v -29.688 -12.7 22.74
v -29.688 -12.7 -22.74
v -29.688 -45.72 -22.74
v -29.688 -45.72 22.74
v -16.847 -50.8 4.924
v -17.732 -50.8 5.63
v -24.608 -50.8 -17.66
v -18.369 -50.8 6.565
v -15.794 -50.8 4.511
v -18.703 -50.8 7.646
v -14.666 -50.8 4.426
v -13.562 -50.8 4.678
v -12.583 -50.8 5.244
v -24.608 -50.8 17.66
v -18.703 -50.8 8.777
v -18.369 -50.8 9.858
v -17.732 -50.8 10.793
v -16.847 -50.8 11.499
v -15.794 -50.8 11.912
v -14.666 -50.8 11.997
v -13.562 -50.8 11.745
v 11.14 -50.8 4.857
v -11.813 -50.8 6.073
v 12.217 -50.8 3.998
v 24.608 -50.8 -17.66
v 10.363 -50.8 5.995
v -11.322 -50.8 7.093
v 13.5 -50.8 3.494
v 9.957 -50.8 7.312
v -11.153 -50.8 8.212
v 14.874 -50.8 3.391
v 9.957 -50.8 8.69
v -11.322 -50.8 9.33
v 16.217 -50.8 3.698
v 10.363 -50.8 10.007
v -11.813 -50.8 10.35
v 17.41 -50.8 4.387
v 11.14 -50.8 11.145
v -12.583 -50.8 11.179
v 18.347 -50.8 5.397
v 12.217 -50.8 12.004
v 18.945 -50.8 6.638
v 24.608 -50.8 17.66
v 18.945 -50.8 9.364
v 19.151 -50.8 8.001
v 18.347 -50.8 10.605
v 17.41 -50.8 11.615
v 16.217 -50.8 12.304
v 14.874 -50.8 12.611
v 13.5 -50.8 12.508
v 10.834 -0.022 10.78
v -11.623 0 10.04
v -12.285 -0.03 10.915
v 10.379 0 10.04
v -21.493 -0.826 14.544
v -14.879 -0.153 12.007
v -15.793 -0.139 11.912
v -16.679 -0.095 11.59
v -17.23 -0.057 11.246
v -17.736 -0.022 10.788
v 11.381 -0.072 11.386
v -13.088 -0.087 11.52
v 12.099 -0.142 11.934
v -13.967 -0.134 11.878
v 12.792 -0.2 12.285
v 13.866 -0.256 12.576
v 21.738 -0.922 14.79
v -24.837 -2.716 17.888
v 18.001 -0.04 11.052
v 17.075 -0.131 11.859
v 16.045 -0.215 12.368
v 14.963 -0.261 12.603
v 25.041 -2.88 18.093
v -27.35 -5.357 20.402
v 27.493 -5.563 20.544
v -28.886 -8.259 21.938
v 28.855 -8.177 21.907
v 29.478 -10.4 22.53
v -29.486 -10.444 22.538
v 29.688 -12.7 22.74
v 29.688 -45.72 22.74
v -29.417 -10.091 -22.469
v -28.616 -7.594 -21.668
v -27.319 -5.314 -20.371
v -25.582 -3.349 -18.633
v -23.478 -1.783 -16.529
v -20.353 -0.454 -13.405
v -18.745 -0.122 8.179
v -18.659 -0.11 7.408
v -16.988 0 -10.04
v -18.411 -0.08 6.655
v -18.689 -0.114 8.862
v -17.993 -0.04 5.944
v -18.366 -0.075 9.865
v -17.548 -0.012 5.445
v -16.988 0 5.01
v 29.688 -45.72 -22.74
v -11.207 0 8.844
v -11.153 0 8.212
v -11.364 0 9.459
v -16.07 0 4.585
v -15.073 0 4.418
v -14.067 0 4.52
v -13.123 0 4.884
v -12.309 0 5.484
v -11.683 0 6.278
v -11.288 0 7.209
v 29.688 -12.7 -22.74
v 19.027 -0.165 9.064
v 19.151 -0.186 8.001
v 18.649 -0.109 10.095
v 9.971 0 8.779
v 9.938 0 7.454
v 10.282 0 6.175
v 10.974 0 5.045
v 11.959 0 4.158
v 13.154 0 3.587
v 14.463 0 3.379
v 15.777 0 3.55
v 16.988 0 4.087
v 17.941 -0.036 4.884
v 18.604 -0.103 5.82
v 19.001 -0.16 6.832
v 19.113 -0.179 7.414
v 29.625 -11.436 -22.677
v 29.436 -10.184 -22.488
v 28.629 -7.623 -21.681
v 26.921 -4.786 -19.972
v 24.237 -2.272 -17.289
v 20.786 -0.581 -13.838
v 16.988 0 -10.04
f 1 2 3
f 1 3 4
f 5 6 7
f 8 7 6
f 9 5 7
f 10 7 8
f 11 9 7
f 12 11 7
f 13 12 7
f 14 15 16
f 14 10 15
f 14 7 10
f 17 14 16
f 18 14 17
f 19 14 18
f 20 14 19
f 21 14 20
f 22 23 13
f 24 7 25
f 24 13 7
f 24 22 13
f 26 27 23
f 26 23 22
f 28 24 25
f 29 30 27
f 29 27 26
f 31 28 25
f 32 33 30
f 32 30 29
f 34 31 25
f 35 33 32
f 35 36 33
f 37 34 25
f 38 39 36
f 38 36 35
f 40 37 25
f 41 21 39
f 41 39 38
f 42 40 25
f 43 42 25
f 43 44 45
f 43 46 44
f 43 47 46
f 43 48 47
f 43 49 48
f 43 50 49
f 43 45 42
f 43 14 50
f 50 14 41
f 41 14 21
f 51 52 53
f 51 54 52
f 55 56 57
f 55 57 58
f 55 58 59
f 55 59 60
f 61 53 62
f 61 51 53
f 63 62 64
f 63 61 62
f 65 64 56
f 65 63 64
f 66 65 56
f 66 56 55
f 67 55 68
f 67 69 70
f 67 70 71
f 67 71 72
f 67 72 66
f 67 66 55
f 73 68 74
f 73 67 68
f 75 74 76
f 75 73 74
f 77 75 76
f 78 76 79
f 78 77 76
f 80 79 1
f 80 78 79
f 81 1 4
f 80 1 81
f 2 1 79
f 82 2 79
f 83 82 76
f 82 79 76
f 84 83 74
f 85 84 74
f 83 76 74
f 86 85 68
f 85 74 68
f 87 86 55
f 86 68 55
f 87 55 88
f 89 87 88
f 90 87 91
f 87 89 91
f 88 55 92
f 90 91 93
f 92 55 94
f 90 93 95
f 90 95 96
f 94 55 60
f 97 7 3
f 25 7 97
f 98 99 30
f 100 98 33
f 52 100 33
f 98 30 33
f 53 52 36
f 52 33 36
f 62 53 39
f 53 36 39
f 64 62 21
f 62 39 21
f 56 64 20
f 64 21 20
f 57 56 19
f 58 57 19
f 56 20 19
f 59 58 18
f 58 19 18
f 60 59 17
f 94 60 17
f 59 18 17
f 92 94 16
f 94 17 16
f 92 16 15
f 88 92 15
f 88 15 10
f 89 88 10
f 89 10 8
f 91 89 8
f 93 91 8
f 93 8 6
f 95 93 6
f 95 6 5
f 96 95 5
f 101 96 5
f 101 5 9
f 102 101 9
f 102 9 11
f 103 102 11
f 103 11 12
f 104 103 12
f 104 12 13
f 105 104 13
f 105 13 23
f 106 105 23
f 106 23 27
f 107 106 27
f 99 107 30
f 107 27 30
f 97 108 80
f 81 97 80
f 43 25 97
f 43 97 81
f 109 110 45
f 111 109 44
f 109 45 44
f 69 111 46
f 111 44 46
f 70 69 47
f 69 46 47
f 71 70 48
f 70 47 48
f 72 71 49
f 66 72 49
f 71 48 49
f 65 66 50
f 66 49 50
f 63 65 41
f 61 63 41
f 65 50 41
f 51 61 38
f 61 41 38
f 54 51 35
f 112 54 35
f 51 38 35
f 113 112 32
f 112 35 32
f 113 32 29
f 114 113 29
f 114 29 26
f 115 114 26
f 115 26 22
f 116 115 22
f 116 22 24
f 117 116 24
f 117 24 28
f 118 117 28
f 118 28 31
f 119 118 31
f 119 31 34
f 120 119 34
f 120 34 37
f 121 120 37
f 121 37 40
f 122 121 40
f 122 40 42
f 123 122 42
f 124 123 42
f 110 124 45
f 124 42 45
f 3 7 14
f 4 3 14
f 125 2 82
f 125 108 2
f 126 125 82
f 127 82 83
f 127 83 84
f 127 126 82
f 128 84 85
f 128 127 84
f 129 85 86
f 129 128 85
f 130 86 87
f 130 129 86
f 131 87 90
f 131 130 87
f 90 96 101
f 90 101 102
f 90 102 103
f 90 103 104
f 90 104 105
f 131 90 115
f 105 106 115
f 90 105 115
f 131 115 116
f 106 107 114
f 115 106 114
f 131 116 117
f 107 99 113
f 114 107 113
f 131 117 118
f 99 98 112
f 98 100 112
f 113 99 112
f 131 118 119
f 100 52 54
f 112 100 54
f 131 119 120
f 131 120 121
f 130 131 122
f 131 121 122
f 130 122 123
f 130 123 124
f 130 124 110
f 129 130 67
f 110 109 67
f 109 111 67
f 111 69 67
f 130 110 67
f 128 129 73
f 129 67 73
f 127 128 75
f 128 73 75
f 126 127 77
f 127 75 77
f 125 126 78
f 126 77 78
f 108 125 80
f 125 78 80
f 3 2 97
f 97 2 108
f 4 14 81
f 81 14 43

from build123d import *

# Parameters (mm, degrees)
F0_W     = 59.375844
F0_H     = 45.479368
F1_DEPTH = 50.8
F2_SIZE  = 5.08
F3_R     = 12.7
F4_R     = 3.795792
F4_R_2   = 4.622578
F5_DEPTH = 50.8


with BuildPart() as f1:
    # F0 (on Front) → F1 (new body)
    with BuildSketch(Plane.XZ):
        Rectangle(F0_W, F0_H)
    extrude(amount=F1_DEPTH)

    # F2
    f2_edges = [f1.edges().sort_by_distance(p)[0] for p in [
        (0, -50.8, 22.739684),
        (29.687922, -50.8, 0),
        (0, -50.8, -22.739684),
        (-29.687922, -50.8, 0),
    ]]
    chamfer(f2_edges, length=F2_SIZE)

    # F3
    f3_edges = [f1.edges().sort_by_distance(p)[0] for p in [
        (29.687922, 0, 0),
        (0, 0, 22.739684),
        (-29.687922, 0, 0),
        (0, 0, -22.739684),
    ]]
    fillet(f3_edges, radius=F3_R)

    # F4 (on face) → F5 (cut)
    with BuildSketch(Plane.XZ.offset(50.8)):
        with Locations((-14.949238, 8.211552)):
            Circle(F4_R)
        with Locations((14.528131, 8.001001)):
            Circle(F4_R_2)
    extrude(amount=-F5_DEPTH, mode=Mode.SUBTRACT)


solid = f1.part
